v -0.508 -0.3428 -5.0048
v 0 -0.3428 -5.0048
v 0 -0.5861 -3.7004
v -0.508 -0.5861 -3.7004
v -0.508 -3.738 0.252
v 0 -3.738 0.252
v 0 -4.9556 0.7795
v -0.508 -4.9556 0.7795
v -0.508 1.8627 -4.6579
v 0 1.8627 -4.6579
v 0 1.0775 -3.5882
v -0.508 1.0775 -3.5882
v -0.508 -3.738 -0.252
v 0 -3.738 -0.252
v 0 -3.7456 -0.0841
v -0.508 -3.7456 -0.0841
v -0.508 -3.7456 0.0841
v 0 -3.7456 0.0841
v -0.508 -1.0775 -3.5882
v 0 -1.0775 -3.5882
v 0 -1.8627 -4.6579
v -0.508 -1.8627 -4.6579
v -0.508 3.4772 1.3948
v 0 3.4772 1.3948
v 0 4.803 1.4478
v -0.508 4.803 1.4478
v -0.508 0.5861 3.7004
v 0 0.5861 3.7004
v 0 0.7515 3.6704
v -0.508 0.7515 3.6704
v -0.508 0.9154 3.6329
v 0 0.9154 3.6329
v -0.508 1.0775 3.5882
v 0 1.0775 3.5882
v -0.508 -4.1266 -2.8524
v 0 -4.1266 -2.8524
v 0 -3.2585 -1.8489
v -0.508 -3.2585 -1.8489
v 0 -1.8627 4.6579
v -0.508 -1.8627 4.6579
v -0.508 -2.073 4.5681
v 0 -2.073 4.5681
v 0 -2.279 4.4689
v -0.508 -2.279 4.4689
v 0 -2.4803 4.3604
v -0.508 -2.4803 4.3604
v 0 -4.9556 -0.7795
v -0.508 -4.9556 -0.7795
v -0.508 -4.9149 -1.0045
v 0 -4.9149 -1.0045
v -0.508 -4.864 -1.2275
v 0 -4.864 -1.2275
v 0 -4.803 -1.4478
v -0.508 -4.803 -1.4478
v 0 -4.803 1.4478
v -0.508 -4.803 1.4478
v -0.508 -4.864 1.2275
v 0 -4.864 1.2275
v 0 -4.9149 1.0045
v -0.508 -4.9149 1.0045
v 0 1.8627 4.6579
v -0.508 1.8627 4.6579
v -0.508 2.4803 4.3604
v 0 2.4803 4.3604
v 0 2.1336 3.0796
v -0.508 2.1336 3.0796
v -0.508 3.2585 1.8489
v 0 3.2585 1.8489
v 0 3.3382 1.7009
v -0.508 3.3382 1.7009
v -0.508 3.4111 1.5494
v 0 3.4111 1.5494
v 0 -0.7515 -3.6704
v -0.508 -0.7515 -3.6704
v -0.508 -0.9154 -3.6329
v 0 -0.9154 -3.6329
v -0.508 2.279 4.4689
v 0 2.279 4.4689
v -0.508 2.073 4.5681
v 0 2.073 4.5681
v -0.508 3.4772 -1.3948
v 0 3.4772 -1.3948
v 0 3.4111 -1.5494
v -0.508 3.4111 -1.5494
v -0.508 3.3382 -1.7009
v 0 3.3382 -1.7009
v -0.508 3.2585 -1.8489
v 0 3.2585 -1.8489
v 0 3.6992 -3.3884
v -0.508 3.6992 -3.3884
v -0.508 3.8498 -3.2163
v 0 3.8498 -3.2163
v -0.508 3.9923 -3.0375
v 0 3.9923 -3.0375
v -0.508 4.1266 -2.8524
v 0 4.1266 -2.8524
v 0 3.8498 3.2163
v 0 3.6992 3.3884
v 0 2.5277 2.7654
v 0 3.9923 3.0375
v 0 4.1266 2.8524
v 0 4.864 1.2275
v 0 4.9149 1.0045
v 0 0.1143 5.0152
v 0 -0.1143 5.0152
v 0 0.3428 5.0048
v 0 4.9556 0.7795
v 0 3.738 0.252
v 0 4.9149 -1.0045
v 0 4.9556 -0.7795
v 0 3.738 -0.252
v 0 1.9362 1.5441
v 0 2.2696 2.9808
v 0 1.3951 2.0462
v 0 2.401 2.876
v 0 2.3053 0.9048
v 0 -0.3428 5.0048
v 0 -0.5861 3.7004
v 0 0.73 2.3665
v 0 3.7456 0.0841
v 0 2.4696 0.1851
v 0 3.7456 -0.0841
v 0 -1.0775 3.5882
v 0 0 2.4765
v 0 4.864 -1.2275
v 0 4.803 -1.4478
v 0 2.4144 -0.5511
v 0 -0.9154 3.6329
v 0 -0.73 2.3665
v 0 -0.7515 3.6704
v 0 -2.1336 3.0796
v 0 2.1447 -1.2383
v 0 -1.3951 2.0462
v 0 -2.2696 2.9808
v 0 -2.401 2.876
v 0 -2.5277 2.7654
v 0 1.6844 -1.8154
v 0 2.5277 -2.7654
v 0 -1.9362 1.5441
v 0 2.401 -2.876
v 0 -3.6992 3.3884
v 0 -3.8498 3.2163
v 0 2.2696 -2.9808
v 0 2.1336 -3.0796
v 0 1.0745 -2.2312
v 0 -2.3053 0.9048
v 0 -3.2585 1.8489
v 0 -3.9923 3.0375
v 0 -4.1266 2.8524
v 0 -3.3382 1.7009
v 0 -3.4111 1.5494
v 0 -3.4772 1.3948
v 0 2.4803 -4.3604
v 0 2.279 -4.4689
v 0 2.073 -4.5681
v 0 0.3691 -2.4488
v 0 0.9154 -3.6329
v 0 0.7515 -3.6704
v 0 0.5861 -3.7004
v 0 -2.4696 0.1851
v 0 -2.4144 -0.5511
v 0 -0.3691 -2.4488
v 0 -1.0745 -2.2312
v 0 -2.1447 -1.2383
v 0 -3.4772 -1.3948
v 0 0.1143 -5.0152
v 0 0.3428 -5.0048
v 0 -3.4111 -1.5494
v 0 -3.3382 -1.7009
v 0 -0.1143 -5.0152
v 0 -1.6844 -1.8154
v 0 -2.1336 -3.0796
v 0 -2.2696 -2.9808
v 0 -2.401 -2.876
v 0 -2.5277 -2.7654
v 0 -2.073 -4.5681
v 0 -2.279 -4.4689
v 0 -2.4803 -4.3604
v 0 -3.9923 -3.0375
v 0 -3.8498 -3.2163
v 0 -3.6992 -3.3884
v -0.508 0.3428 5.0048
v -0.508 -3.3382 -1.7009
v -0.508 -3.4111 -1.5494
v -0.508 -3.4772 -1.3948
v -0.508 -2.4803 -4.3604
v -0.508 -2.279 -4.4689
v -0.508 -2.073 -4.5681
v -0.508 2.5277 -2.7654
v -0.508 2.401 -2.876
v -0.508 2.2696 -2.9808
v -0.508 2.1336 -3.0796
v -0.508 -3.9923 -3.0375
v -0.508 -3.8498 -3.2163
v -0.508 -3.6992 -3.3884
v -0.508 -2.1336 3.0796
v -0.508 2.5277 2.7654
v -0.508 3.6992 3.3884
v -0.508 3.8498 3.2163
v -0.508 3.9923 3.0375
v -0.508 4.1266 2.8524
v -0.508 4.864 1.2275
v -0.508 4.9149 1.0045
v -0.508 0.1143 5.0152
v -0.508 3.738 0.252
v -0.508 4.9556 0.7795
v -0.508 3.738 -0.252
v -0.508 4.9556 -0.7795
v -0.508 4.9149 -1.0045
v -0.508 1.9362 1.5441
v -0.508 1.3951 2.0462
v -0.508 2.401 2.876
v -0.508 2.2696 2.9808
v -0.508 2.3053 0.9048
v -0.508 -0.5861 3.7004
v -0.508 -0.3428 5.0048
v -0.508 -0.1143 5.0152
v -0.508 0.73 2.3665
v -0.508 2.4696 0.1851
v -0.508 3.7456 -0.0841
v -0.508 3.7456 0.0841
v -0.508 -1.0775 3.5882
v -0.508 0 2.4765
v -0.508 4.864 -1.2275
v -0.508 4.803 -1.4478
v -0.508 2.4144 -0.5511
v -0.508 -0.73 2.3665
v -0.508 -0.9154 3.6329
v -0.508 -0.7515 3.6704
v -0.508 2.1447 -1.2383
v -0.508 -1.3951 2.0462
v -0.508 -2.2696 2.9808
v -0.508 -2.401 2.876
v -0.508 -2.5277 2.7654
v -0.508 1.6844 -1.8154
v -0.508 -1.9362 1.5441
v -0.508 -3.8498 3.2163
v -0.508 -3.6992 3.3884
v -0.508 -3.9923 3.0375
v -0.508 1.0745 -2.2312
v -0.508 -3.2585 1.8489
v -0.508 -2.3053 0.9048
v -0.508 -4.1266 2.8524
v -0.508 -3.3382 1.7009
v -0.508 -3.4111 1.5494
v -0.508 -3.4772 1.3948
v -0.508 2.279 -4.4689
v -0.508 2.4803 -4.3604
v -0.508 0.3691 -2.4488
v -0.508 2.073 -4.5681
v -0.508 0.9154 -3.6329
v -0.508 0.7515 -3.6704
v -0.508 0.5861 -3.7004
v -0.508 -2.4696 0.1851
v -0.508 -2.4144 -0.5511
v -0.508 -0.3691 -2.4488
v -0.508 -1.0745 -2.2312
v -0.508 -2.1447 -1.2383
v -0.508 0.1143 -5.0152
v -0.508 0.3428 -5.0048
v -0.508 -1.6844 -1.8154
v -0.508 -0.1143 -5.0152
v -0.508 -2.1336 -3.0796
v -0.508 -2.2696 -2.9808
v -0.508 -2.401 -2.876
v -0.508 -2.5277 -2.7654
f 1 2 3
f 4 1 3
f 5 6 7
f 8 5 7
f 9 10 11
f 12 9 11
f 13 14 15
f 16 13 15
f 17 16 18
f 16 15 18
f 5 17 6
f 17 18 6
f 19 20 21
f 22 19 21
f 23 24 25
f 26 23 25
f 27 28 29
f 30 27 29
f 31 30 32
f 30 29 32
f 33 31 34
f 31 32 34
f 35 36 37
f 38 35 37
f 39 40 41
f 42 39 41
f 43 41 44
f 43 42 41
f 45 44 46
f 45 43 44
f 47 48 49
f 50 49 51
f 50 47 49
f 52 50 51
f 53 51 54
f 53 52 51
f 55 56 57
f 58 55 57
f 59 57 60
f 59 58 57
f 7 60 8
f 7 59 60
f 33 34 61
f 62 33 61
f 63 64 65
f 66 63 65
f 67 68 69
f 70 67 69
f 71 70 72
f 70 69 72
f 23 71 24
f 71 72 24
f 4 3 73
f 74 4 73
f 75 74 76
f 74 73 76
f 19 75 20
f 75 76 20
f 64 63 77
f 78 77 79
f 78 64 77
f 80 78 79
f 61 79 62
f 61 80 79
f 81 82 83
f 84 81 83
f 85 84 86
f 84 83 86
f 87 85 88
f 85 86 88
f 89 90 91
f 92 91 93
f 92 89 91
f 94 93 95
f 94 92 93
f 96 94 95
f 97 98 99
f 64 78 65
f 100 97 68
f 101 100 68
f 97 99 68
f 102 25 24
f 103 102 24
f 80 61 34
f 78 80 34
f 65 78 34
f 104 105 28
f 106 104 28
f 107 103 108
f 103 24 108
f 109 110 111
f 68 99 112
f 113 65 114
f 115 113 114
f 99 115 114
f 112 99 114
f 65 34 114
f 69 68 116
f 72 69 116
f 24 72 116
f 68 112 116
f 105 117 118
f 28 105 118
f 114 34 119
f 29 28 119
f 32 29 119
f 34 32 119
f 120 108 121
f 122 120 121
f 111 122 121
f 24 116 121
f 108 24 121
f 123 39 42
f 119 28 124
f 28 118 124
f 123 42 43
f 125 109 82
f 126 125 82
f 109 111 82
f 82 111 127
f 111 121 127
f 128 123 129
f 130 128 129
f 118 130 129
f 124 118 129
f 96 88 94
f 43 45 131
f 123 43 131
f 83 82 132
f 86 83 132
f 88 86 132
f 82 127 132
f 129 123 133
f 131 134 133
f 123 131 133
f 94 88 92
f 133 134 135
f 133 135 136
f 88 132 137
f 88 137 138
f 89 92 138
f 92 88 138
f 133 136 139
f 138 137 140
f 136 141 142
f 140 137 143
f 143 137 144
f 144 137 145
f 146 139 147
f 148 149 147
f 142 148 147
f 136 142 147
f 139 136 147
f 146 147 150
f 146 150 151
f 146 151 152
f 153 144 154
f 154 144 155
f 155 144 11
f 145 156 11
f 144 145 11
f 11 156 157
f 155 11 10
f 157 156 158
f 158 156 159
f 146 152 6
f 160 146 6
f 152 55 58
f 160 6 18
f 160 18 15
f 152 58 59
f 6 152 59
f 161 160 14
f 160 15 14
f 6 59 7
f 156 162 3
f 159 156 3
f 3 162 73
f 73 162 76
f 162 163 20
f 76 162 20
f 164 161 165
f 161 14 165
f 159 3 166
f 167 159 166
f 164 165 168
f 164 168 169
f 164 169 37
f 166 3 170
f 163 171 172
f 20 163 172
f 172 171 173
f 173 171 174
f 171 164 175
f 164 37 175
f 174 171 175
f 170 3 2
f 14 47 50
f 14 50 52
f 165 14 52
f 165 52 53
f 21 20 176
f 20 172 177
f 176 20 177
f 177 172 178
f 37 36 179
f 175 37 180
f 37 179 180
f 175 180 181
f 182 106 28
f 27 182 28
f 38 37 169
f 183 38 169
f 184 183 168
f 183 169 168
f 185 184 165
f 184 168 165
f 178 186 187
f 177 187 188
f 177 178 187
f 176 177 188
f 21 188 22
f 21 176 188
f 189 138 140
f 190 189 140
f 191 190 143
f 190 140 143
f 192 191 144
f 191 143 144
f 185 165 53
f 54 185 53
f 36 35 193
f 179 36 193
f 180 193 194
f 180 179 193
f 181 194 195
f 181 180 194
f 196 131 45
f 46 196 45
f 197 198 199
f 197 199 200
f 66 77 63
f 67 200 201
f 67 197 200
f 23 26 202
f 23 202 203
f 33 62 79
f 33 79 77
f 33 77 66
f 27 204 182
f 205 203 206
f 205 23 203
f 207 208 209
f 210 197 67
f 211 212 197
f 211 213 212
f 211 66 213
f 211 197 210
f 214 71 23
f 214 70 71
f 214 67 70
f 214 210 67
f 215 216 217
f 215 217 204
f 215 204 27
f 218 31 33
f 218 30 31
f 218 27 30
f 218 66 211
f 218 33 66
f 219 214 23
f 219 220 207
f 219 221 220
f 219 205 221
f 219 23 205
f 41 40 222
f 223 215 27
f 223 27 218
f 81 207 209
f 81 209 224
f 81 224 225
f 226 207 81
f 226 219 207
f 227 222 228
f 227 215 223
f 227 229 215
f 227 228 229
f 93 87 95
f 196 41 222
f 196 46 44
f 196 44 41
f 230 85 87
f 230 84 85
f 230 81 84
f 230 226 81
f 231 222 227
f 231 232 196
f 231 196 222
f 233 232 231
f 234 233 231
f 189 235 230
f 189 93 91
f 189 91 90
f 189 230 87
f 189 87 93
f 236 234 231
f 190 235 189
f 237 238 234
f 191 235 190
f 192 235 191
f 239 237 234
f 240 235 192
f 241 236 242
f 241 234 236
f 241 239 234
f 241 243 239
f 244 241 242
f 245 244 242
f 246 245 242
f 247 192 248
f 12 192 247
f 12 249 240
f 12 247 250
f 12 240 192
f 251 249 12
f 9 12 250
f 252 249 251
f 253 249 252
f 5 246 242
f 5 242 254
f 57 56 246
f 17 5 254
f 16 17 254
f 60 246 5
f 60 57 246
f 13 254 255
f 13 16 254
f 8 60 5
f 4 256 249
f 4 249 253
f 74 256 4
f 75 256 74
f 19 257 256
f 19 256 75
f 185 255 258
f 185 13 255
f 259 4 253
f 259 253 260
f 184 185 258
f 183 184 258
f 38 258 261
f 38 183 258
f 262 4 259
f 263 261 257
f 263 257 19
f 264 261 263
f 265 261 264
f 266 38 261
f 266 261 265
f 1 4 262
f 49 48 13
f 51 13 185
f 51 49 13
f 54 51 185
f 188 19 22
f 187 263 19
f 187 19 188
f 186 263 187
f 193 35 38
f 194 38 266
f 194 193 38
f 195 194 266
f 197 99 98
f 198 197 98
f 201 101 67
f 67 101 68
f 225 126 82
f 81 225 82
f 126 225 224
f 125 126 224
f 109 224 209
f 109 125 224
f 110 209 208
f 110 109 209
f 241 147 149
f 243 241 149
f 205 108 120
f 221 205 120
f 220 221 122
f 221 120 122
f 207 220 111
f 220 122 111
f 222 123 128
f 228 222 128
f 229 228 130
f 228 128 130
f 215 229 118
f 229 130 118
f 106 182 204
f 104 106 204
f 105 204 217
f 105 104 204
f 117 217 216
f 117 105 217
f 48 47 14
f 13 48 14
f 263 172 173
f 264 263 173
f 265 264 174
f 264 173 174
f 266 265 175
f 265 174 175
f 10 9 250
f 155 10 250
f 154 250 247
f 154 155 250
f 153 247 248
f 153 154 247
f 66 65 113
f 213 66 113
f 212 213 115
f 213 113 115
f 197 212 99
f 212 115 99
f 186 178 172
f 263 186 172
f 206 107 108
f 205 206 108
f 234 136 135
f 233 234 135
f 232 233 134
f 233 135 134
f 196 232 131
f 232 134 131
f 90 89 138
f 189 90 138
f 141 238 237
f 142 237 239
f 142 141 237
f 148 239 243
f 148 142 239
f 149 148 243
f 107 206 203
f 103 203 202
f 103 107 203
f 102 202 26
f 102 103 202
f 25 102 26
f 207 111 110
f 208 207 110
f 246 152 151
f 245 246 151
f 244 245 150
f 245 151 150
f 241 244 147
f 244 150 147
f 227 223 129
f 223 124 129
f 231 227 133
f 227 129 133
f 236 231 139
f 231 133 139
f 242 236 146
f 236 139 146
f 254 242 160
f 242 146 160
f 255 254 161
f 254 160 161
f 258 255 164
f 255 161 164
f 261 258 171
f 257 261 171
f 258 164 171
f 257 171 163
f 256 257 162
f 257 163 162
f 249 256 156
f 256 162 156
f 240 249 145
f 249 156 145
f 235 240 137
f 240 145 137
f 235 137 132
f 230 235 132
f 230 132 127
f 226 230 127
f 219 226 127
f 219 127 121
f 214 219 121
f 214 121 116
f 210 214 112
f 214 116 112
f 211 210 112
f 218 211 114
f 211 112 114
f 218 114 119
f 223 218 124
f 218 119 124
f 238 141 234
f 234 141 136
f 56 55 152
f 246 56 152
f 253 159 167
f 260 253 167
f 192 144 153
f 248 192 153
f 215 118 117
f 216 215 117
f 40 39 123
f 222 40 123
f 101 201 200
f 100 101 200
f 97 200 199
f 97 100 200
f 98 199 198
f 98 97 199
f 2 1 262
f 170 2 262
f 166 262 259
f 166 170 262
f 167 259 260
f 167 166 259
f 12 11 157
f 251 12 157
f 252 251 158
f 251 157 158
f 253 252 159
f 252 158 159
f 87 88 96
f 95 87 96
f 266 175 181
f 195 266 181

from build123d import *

# Parameters (mm, degrees)
SECSKE_W      = 0.508
SECSKE_H      = 2.54
EXTCUT_DEPTH  = 8.112566942
EXTCUTS_COUNT = 14


with BuildPart() as part:
    # SecSke → Body (revolve)
    with BuildSketch(Plane.XY, mode=Mode.PRIVATE) as body_sk:
        with Locations((-0.254, 3.7465)):
            Rectangle(SECSKE_W, SECSKE_H)
    revolve(body_sk.sketch.rotate(Axis((-34.925, 0, 0), (1, 0, 0)), 90), axis=Axis((-34.925, 0, 0), (1, 0, 0)))

    # ExtCutSke → ExtCut (cut, through all)
    with BuildSketch(Plane(origin=(0, 0, 0), x_dir=(0, 0, -1), z_dir=(1, 0, 0))):
        with BuildLine():
            Line((-0.882309718, 5.192903063), (-0.25202333, 3.738013709))
            ThreePointArc((-0.25202333, 3.738013709), (0, 3.7465), (0.25202333, 3.738013709))
            Line((0.25202333, 3.738013709), (0.882309718, 5.192903063))
            ThreePointArc((0.882309718, 5.192903063), (0, 5.267325), (-0.882309718, 5.192903063))
        make_face()
    extcut = extrude(amount=-EXTCUT_DEPTH, mode=Mode.SUBTRACT)

    # ExtCuts: ExtCut ×14 about axis
    extcuts_axis = Axis((0, 0, 0), (1, 0, 0))
    for i in range(1, EXTCUTS_COUNT):
        add(extcut.rotate(extcuts_axis, i * 360 / EXTCUTS_COUNT), mode=Mode.SUBTRACT)


solid = part.part
